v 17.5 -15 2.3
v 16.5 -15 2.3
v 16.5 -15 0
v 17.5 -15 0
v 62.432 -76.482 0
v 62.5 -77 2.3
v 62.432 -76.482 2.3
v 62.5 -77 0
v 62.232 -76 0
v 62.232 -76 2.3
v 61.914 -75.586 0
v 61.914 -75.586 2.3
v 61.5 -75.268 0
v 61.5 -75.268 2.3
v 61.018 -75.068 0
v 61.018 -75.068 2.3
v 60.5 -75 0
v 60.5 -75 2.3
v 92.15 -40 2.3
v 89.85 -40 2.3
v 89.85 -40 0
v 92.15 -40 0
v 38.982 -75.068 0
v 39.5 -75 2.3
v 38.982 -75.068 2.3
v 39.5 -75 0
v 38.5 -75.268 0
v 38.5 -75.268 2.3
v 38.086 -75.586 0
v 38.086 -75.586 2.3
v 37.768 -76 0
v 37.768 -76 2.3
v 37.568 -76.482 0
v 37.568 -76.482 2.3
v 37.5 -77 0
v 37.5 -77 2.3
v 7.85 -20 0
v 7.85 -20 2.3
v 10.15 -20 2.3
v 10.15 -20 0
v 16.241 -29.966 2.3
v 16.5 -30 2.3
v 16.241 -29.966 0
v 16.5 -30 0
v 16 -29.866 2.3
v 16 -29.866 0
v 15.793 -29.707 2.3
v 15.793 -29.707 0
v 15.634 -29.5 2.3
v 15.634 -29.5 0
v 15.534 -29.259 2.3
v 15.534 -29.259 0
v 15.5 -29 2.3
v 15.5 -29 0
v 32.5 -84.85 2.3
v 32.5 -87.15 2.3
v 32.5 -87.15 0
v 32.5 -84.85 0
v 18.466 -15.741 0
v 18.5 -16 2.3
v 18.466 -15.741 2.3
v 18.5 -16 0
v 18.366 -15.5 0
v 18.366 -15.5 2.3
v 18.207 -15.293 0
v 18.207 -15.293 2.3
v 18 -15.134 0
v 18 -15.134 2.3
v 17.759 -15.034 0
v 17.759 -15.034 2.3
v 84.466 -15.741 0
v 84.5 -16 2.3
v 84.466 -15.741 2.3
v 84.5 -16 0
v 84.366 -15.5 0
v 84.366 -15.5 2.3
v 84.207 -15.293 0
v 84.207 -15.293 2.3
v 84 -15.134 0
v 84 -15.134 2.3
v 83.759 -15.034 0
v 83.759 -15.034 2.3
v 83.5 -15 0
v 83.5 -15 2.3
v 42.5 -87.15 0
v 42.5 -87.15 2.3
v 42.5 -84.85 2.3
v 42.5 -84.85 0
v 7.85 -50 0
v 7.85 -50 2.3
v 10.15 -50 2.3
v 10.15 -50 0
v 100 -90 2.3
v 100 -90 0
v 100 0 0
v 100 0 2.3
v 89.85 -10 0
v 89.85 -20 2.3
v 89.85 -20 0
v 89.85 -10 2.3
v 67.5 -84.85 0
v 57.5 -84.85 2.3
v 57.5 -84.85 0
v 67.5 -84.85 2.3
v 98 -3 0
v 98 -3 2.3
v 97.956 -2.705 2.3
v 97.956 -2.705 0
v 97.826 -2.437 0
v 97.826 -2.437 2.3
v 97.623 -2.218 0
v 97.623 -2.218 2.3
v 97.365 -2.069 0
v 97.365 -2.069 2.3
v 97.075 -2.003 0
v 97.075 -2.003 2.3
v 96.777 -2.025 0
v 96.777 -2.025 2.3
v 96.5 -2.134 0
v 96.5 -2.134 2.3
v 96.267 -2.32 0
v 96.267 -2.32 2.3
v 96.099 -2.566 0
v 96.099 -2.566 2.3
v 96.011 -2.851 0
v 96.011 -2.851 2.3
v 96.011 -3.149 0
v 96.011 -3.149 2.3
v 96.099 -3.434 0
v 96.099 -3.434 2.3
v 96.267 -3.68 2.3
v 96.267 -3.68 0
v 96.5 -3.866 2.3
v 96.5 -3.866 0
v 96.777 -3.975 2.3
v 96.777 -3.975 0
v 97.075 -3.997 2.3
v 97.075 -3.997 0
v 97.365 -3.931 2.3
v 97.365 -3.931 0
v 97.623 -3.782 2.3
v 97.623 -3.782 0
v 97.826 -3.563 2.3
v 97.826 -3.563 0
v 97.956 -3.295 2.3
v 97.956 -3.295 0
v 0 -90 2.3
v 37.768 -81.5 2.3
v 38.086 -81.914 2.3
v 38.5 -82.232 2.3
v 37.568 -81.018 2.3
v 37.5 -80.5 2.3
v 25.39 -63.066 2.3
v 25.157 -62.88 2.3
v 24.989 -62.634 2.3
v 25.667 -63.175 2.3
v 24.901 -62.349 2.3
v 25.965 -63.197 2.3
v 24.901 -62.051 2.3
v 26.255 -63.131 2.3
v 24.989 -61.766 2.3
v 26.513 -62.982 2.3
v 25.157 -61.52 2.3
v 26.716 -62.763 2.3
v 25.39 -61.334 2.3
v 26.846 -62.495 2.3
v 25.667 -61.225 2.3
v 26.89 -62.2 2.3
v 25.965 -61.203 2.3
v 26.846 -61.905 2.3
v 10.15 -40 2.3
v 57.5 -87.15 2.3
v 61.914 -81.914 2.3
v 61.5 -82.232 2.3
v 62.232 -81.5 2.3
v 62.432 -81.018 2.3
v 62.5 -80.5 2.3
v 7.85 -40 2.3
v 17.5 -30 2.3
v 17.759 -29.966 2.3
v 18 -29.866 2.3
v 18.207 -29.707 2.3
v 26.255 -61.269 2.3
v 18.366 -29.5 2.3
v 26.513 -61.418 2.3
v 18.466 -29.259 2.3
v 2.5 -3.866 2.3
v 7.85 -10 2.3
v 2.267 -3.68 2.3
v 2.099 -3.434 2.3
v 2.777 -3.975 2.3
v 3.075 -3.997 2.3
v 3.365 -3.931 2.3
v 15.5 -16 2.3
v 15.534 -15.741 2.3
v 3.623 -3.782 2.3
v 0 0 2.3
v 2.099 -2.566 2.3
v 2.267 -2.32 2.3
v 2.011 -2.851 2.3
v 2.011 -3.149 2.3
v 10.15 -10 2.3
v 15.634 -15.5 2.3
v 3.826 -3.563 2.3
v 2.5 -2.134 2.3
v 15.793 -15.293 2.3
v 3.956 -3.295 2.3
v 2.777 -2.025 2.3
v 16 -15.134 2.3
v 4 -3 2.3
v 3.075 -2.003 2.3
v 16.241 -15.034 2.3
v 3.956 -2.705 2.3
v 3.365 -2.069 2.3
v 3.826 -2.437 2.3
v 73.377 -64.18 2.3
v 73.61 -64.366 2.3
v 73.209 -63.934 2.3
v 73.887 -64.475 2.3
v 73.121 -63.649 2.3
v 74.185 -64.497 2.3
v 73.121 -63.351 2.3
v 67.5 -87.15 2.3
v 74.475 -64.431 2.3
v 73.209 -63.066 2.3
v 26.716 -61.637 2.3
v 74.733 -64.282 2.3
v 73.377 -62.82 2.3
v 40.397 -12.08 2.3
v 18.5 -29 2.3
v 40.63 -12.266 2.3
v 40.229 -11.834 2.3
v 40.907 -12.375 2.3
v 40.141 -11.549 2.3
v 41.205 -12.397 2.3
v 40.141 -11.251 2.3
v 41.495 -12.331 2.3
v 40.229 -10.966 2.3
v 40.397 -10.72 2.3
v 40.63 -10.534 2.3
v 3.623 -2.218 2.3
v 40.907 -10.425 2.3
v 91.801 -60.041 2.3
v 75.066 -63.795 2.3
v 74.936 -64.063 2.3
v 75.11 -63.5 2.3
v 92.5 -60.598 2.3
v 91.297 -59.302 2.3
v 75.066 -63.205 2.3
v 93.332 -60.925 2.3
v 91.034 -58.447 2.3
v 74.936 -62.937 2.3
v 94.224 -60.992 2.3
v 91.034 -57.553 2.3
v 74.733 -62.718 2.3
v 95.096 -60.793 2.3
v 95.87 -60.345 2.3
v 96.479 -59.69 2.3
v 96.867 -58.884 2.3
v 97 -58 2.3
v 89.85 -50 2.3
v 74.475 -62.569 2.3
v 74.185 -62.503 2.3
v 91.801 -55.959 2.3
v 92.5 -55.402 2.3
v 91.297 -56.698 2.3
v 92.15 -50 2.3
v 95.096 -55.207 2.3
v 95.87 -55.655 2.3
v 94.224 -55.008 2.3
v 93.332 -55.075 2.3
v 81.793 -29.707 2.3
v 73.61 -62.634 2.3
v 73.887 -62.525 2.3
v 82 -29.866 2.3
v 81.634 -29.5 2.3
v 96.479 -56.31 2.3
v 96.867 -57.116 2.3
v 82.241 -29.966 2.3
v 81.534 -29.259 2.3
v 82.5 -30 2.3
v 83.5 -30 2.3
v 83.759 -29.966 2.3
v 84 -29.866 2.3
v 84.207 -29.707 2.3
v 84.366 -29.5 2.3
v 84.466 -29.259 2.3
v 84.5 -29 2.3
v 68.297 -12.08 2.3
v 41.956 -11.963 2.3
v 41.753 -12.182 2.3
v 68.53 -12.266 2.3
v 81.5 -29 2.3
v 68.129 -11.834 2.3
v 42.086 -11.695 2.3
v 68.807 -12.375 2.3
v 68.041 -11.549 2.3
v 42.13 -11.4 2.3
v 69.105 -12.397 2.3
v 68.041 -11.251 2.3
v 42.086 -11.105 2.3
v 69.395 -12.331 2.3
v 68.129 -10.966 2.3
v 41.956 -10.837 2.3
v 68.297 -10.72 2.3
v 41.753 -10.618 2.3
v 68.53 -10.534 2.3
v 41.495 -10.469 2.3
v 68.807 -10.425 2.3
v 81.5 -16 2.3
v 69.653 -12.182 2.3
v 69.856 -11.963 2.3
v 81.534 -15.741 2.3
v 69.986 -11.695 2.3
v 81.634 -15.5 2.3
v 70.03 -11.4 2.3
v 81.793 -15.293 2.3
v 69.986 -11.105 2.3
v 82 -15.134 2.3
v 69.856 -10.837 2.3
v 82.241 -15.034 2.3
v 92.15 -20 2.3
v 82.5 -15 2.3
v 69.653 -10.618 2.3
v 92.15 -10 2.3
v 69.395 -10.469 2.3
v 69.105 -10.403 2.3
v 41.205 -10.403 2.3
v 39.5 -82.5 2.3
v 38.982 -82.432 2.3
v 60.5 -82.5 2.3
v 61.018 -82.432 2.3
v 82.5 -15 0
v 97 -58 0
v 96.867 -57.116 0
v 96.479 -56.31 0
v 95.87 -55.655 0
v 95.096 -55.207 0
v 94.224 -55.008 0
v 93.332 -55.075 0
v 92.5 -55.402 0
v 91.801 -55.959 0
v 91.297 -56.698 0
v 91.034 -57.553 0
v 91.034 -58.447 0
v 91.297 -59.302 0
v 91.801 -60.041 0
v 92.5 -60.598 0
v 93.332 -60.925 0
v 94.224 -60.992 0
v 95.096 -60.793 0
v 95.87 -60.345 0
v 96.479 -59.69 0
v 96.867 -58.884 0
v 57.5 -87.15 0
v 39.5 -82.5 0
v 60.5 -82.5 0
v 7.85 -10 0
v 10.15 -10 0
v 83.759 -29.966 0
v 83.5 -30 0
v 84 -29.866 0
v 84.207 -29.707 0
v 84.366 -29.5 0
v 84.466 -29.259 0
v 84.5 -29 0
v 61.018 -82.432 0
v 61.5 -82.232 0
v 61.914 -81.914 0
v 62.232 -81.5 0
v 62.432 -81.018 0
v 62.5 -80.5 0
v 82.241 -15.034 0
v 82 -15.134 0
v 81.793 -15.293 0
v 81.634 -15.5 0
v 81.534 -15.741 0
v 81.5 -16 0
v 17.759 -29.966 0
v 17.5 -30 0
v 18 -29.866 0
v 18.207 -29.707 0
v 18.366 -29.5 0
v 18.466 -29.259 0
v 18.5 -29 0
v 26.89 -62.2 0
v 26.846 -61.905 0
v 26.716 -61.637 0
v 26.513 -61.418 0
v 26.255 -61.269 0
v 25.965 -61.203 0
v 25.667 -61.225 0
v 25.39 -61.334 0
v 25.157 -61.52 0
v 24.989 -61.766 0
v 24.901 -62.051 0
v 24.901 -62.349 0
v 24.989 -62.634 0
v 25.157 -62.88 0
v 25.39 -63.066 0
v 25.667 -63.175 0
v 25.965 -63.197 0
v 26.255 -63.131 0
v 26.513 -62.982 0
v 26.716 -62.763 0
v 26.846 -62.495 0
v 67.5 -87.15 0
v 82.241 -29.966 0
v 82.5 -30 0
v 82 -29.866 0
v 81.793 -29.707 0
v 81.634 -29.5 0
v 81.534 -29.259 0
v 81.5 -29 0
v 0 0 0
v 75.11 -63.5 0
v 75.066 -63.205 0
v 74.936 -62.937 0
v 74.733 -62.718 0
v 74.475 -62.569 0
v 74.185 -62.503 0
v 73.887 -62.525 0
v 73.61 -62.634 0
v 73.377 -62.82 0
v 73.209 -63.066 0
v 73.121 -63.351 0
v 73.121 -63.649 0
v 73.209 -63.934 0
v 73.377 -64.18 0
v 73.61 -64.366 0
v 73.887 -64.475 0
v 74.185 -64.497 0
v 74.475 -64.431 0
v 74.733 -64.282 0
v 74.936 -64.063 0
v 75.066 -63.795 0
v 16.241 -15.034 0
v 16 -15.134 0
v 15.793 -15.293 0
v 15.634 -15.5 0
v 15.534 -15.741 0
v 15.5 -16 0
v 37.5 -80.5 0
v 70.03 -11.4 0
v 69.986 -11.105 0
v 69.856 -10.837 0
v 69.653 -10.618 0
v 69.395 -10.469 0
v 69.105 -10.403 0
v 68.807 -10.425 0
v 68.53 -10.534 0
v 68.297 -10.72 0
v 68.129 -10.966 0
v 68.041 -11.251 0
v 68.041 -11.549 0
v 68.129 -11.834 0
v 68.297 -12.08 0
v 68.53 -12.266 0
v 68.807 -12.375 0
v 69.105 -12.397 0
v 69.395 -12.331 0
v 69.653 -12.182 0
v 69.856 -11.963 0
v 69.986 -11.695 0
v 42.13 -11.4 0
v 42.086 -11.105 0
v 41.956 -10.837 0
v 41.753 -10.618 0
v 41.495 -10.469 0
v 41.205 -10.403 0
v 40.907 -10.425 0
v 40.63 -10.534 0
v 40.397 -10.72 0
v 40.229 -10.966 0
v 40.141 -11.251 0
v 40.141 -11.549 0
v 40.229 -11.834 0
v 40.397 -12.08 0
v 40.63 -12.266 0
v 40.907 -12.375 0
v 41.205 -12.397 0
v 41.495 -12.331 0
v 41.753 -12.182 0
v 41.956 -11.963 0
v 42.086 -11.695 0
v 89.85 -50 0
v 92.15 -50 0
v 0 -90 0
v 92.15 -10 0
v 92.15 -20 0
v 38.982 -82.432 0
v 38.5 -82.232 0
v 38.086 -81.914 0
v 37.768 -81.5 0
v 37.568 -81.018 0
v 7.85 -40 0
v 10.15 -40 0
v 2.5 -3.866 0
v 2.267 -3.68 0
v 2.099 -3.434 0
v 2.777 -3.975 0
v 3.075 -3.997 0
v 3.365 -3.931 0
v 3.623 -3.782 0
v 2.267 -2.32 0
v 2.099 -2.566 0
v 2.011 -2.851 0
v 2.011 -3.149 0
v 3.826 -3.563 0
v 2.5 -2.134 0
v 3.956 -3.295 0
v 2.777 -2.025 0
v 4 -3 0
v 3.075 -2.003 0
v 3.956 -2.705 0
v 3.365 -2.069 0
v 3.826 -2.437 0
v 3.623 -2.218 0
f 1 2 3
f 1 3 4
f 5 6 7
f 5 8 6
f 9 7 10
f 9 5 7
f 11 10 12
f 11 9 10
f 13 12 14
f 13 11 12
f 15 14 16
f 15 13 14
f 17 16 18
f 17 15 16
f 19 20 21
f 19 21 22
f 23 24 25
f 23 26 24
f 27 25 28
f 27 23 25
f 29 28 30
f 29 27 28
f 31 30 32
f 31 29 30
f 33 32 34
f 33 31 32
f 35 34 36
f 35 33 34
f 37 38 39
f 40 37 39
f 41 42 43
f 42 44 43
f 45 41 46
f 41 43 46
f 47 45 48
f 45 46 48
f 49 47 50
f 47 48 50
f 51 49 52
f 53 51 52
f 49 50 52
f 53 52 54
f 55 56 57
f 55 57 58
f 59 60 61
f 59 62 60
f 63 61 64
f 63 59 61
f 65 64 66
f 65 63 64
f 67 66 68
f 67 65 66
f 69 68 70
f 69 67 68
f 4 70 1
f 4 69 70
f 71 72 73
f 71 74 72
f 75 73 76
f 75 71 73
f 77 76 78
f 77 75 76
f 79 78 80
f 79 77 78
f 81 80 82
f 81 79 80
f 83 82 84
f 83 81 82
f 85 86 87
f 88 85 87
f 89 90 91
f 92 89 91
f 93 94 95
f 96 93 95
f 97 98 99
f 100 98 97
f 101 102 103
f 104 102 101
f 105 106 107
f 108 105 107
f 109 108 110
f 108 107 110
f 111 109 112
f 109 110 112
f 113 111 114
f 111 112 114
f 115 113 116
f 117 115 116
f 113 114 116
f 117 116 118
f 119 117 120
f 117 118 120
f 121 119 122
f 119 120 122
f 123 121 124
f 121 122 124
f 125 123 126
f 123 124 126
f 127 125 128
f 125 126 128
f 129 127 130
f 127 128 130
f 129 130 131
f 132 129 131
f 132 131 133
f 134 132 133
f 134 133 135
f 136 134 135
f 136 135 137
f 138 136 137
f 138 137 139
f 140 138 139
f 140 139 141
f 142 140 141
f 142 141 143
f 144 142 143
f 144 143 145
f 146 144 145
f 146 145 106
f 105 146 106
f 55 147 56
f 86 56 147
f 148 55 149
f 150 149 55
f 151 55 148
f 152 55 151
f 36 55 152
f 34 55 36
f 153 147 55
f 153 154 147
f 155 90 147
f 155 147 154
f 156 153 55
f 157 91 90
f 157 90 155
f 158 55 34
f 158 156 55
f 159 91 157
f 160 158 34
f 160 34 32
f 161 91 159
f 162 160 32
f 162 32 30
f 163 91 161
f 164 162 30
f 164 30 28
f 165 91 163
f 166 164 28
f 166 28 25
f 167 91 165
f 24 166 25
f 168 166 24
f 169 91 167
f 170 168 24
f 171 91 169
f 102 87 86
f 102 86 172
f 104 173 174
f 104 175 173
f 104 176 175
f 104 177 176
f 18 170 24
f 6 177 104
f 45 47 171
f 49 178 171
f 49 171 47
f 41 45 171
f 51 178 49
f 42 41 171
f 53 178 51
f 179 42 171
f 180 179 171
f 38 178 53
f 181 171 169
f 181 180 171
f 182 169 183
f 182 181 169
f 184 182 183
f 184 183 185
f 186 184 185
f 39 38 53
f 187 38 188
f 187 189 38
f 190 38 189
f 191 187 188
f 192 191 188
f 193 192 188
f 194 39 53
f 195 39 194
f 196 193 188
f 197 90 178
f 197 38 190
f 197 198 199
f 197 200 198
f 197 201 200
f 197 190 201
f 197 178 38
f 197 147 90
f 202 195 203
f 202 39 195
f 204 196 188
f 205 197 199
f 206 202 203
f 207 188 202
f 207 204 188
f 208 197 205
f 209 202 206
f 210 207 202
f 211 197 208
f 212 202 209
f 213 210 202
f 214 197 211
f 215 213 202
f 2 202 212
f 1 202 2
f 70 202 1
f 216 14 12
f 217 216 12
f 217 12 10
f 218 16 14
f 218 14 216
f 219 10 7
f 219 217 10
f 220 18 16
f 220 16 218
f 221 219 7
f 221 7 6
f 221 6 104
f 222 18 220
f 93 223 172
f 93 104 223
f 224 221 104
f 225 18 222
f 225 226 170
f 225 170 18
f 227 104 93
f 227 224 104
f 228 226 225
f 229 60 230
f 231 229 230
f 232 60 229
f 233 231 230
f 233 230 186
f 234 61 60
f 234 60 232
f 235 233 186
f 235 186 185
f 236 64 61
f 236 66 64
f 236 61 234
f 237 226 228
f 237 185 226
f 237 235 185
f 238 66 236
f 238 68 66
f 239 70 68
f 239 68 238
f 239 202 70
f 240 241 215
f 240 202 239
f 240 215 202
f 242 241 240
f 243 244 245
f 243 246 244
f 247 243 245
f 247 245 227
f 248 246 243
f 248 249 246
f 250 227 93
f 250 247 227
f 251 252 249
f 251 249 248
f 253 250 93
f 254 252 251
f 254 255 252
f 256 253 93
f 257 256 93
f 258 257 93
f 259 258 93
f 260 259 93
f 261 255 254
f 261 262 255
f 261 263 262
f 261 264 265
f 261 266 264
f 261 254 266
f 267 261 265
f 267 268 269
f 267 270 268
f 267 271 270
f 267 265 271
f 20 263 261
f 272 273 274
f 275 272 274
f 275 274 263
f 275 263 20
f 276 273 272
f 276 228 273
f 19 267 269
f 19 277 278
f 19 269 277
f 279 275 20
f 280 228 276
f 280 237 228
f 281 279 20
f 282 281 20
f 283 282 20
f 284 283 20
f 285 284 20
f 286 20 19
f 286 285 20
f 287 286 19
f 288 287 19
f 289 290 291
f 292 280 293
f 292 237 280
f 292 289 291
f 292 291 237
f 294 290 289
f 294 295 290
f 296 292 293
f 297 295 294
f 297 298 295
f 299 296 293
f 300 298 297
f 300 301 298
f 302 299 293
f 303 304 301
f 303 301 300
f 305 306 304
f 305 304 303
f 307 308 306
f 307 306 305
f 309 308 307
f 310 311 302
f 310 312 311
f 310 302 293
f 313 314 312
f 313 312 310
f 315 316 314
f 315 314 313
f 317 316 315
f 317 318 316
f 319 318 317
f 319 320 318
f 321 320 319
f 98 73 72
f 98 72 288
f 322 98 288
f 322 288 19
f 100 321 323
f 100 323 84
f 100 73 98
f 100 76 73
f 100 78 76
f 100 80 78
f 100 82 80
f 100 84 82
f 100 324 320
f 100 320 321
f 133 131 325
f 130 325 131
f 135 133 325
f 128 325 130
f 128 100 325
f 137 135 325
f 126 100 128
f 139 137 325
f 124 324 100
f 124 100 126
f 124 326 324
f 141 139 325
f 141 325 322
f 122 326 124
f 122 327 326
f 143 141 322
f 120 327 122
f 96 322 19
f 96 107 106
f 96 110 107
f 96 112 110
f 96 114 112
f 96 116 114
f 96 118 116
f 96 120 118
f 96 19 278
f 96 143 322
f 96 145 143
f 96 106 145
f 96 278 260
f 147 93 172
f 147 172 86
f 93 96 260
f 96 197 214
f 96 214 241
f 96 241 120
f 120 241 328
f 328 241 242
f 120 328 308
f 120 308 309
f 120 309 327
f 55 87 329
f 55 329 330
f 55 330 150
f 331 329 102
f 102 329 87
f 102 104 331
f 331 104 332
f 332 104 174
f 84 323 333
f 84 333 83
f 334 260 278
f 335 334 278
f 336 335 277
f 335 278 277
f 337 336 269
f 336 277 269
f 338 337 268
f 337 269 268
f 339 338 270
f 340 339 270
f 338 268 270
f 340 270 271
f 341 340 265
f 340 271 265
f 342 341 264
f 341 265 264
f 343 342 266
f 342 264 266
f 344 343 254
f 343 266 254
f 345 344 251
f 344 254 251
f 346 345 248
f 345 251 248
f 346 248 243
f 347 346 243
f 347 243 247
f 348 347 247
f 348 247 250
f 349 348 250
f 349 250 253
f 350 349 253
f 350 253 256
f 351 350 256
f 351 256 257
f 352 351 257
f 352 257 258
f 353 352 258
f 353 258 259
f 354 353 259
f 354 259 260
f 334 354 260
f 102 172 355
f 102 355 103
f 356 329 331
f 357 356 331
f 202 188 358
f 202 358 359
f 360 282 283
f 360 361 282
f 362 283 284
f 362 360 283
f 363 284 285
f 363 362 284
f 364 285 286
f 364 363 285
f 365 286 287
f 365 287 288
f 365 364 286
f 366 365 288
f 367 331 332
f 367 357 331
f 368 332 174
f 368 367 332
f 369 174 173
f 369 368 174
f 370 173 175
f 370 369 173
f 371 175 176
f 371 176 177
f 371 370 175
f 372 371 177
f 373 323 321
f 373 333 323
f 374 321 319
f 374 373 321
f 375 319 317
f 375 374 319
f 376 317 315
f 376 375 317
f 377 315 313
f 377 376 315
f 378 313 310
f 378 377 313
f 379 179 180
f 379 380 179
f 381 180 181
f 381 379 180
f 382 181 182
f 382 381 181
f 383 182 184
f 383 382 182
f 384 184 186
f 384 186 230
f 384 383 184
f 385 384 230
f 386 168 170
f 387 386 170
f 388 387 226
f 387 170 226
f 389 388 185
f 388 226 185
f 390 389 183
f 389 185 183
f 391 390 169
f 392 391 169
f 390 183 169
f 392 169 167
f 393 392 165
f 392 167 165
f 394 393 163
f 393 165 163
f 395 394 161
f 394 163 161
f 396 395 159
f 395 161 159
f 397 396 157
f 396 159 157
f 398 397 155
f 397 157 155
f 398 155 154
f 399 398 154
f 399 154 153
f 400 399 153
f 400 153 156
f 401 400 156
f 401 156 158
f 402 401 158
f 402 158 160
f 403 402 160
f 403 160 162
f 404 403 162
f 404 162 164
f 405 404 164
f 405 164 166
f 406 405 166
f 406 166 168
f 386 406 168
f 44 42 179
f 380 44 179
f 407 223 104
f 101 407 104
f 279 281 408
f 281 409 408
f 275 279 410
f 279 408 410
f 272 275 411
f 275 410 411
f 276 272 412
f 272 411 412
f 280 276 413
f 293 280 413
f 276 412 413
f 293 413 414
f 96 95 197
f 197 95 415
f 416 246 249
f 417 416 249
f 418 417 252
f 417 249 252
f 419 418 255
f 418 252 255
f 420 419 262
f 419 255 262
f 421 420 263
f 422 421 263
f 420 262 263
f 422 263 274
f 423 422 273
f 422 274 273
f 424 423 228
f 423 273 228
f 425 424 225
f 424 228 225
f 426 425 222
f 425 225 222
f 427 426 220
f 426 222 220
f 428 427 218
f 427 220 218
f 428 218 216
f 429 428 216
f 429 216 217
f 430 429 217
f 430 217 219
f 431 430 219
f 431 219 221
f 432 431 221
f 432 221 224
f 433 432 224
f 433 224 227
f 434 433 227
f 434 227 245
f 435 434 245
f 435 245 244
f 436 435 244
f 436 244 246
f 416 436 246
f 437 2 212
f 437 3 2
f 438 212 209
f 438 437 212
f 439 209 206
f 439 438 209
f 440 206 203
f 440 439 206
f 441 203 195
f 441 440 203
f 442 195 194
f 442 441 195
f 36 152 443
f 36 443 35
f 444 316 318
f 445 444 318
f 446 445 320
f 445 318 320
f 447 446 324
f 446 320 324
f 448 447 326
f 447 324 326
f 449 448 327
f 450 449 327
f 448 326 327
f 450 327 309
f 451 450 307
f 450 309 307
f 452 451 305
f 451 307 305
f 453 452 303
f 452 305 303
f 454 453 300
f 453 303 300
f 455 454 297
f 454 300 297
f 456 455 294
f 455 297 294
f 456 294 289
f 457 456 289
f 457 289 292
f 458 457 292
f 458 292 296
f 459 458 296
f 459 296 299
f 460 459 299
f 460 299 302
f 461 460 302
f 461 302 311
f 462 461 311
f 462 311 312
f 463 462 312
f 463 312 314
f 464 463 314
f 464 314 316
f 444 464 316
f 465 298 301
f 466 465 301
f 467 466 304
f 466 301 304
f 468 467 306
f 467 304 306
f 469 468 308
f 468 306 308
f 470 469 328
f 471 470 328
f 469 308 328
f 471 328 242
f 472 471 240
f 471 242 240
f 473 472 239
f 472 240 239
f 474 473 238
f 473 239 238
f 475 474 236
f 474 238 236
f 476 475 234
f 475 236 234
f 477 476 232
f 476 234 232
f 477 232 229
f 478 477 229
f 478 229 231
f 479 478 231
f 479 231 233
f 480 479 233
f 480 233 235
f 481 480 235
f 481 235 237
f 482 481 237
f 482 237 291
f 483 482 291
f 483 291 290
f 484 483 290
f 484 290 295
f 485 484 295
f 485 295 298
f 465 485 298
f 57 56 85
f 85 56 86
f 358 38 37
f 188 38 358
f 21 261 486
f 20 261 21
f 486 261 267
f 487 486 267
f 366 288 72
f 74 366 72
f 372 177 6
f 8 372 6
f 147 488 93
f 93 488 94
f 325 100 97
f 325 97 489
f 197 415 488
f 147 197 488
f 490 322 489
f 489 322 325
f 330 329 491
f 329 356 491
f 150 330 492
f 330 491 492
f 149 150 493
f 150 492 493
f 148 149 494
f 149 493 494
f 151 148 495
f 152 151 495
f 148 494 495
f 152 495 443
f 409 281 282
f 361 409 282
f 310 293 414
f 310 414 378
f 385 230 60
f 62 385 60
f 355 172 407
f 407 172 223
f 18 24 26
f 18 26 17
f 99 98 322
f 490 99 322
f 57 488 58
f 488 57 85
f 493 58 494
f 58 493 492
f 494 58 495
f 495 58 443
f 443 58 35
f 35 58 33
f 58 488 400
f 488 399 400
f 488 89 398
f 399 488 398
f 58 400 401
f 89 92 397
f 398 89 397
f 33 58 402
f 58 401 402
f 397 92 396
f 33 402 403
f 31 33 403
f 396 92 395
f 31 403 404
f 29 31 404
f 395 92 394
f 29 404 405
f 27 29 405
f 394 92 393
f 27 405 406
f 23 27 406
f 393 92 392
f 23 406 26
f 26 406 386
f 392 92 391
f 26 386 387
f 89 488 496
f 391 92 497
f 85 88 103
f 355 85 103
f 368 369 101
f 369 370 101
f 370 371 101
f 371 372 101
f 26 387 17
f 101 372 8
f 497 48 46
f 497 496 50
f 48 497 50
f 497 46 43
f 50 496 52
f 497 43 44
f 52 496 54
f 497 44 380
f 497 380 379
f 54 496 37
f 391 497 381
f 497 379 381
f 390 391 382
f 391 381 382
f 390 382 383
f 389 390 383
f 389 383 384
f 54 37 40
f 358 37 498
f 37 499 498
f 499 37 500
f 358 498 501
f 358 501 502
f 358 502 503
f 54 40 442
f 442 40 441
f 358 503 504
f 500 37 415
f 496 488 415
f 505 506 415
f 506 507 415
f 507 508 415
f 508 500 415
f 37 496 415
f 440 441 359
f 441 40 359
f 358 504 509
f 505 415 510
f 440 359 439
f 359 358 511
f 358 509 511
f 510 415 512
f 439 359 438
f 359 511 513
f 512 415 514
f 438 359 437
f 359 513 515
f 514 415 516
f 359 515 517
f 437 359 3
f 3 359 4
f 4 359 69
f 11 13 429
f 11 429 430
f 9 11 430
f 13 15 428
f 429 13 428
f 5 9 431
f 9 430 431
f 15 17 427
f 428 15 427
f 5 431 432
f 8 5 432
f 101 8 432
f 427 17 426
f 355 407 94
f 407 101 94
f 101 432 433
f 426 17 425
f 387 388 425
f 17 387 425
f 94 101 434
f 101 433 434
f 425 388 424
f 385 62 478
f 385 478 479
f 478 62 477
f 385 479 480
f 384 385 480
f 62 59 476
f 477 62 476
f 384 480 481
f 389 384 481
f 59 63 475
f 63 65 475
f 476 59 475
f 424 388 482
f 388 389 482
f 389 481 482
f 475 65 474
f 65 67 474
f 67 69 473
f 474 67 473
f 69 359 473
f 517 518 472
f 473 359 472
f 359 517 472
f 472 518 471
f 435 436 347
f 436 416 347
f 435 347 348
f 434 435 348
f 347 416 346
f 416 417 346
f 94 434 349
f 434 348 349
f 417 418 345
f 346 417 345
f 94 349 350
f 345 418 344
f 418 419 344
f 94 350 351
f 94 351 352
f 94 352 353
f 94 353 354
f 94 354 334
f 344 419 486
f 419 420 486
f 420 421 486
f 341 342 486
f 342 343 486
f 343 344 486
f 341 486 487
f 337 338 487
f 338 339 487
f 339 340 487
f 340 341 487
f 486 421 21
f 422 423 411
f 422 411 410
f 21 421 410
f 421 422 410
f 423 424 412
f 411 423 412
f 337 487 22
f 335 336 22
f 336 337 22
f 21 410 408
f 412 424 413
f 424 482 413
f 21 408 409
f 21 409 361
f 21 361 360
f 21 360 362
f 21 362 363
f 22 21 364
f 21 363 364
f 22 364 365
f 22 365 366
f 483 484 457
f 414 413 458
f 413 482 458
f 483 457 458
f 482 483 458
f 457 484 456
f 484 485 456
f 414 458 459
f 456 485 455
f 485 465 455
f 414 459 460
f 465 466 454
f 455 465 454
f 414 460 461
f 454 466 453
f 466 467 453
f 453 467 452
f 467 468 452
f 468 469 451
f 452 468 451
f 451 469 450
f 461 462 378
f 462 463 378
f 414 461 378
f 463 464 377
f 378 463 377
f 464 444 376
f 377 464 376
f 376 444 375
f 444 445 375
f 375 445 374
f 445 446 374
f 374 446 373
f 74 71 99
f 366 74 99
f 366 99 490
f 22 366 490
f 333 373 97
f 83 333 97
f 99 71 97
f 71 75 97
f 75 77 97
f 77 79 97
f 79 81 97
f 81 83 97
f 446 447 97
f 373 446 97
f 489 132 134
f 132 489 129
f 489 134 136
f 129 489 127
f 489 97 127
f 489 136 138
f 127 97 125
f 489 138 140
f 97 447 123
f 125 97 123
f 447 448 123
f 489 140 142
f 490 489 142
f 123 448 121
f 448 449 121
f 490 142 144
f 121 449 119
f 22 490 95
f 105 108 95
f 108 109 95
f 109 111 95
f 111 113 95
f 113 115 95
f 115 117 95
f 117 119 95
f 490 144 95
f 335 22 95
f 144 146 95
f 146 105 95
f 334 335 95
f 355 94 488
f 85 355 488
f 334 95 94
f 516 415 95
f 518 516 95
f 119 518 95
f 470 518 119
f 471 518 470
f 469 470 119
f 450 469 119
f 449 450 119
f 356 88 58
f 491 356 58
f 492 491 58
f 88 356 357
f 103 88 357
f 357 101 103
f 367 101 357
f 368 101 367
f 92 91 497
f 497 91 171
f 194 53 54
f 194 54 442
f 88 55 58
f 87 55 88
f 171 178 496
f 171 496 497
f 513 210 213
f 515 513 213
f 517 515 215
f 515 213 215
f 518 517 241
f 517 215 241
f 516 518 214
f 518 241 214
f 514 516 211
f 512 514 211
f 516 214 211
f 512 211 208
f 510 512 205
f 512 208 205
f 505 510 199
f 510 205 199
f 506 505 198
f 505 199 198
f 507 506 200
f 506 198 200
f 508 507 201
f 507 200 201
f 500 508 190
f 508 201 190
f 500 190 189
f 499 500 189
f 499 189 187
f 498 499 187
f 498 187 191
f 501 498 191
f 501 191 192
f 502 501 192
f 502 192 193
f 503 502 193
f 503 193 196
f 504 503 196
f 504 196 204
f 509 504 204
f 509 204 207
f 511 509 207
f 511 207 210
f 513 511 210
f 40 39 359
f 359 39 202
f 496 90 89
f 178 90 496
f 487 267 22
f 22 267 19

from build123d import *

# Parameters (mm, degrees)
BOSS_EXTRUDE1_DEPTH = 2.3
SKETCH7_W           = 2.3
SKETCH7_H           = 10
SKETCH7_W_2         = 10
SKETCH7_H_2         = 2.3
CUT_EXTRUDE2_DEPTH  = 3.3
SKETCH9_R           = 1
CUT_EXTRUDE4_DEPTH  = 3.3
SKETCH10_W          = 3
SKETCH10_H          = 15
SKETCH10_W_2        = 25
SKETCH10_H_2        = 7.5
CUT_EXTRUDE5_DEPTH  = 3.3
FILLET2_R           = 1
FILLET3_R           = 2
SKETCH11_R          = 3
CUT_EXTRUDE6_DEPTH  = 10


with BuildPart() as part:
    # Sketch1 → Boss-Extrude1 (new body)
    with BuildSketch(Plane.XY):
        Polygon((0, -57), (0, -90), (23, -90), (77, -90), (100, -90), (100, -57), (100, 0), (0, 0), align=None)
    extrude(amount=BOSS_EXTRUDE1_DEPTH)

    # Sketch7 → Cut-Extrude2 (cut, through all)
    with BuildSketch(Plane.XY.offset(2.3)):
        with Locations((91, -15)):
            Rectangle(SKETCH7_W, SKETCH7_H)
        with Locations((91, -45)):
            Rectangle(SKETCH7_W, SKETCH7_H)
        with Locations((9, -15)):
            Rectangle(SKETCH7_W, SKETCH7_H)
        with Locations((9, -45)):
            Rectangle(SKETCH7_W, SKETCH7_H)
        with Locations((37.5, -86)):
            Rectangle(SKETCH7_W_2, SKETCH7_H_2)
        with Locations((62.5, -86)):
            Rectangle(SKETCH7_W_2, SKETCH7_H_2)
    extrude(amount=-CUT_EXTRUDE2_DEPTH, mode=Mode.SUBTRACT)

    # Sketch9 → Cut-Extrude4 (cut, through all)
    with BuildSketch(Plane.XY.offset(2.3)):
        with Locations((3, -3)):
            Circle(SKETCH9_R)
        with Locations((97, -3)):
            Circle(SKETCH9_R)
        with Locations((41.13, -11.4)):
            Circle(SKETCH9_R)
        with Locations((69.03, -11.4)):
            Circle(SKETCH9_R)
        with Locations((25.89, -62.2)):
            Circle(SKETCH9_R)
        with Locations((74.11, -63.5)):
            Circle(SKETCH9_R)
    extrude(amount=-CUT_EXTRUDE4_DEPTH, mode=Mode.SUBTRACT)

    # Sketch10 → Cut-Extrude5 (cut, through all)
    with BuildSketch(Plane.XY.offset(2.3)):
        with Locations((17, -22.5)):
            Rectangle(SKETCH10_W, SKETCH10_H)
        with Locations((83, -22.5)):
            Rectangle(SKETCH10_W, SKETCH10_H)
        with Locations((50, -78.75)):
            Rectangle(SKETCH10_W_2, SKETCH10_H_2)
    extrude(amount=-CUT_EXTRUDE5_DEPTH, mode=Mode.SUBTRACT)

    # Fillet2
    fillet2_edges = [part.edges().sort_by_distance(p)[0] for p in [
        (15.5, -30, 1.15),
        (15.5, -15, 1.15),
        (18.5, -15, 1.15),
        (18.5, -30, 1.15),
        (81.5, -30, 1.15),
        (81.5, -15, 1.15),
        (84.5, -15, 1.15),
        (84.5, -30, 1.15),
    ]]
    fillet(fillet2_edges, radius=FILLET2_R)

    # Fillet3
    fillet3_edges = [part.edges().sort_by_distance(p)[0] for p in [
        (37.5, -82.5, 1.15),
        (37.5, -75, 1.15),
        (62.5, -75, 1.15),
        (62.5, -82.5, 1.15),
    ]]
    fillet(fillet3_edges, radius=FILLET3_R)

    # Sketch11 → Cut-Extrude6 (cut)
    with BuildSketch(Plane.XY.offset(2.3)):
        with Locations((94, -58)):
            Circle(SKETCH11_R)
    extrude(amount=-CUT_EXTRUDE6_DEPTH, mode=Mode.SUBTRACT)


solid = part.part
